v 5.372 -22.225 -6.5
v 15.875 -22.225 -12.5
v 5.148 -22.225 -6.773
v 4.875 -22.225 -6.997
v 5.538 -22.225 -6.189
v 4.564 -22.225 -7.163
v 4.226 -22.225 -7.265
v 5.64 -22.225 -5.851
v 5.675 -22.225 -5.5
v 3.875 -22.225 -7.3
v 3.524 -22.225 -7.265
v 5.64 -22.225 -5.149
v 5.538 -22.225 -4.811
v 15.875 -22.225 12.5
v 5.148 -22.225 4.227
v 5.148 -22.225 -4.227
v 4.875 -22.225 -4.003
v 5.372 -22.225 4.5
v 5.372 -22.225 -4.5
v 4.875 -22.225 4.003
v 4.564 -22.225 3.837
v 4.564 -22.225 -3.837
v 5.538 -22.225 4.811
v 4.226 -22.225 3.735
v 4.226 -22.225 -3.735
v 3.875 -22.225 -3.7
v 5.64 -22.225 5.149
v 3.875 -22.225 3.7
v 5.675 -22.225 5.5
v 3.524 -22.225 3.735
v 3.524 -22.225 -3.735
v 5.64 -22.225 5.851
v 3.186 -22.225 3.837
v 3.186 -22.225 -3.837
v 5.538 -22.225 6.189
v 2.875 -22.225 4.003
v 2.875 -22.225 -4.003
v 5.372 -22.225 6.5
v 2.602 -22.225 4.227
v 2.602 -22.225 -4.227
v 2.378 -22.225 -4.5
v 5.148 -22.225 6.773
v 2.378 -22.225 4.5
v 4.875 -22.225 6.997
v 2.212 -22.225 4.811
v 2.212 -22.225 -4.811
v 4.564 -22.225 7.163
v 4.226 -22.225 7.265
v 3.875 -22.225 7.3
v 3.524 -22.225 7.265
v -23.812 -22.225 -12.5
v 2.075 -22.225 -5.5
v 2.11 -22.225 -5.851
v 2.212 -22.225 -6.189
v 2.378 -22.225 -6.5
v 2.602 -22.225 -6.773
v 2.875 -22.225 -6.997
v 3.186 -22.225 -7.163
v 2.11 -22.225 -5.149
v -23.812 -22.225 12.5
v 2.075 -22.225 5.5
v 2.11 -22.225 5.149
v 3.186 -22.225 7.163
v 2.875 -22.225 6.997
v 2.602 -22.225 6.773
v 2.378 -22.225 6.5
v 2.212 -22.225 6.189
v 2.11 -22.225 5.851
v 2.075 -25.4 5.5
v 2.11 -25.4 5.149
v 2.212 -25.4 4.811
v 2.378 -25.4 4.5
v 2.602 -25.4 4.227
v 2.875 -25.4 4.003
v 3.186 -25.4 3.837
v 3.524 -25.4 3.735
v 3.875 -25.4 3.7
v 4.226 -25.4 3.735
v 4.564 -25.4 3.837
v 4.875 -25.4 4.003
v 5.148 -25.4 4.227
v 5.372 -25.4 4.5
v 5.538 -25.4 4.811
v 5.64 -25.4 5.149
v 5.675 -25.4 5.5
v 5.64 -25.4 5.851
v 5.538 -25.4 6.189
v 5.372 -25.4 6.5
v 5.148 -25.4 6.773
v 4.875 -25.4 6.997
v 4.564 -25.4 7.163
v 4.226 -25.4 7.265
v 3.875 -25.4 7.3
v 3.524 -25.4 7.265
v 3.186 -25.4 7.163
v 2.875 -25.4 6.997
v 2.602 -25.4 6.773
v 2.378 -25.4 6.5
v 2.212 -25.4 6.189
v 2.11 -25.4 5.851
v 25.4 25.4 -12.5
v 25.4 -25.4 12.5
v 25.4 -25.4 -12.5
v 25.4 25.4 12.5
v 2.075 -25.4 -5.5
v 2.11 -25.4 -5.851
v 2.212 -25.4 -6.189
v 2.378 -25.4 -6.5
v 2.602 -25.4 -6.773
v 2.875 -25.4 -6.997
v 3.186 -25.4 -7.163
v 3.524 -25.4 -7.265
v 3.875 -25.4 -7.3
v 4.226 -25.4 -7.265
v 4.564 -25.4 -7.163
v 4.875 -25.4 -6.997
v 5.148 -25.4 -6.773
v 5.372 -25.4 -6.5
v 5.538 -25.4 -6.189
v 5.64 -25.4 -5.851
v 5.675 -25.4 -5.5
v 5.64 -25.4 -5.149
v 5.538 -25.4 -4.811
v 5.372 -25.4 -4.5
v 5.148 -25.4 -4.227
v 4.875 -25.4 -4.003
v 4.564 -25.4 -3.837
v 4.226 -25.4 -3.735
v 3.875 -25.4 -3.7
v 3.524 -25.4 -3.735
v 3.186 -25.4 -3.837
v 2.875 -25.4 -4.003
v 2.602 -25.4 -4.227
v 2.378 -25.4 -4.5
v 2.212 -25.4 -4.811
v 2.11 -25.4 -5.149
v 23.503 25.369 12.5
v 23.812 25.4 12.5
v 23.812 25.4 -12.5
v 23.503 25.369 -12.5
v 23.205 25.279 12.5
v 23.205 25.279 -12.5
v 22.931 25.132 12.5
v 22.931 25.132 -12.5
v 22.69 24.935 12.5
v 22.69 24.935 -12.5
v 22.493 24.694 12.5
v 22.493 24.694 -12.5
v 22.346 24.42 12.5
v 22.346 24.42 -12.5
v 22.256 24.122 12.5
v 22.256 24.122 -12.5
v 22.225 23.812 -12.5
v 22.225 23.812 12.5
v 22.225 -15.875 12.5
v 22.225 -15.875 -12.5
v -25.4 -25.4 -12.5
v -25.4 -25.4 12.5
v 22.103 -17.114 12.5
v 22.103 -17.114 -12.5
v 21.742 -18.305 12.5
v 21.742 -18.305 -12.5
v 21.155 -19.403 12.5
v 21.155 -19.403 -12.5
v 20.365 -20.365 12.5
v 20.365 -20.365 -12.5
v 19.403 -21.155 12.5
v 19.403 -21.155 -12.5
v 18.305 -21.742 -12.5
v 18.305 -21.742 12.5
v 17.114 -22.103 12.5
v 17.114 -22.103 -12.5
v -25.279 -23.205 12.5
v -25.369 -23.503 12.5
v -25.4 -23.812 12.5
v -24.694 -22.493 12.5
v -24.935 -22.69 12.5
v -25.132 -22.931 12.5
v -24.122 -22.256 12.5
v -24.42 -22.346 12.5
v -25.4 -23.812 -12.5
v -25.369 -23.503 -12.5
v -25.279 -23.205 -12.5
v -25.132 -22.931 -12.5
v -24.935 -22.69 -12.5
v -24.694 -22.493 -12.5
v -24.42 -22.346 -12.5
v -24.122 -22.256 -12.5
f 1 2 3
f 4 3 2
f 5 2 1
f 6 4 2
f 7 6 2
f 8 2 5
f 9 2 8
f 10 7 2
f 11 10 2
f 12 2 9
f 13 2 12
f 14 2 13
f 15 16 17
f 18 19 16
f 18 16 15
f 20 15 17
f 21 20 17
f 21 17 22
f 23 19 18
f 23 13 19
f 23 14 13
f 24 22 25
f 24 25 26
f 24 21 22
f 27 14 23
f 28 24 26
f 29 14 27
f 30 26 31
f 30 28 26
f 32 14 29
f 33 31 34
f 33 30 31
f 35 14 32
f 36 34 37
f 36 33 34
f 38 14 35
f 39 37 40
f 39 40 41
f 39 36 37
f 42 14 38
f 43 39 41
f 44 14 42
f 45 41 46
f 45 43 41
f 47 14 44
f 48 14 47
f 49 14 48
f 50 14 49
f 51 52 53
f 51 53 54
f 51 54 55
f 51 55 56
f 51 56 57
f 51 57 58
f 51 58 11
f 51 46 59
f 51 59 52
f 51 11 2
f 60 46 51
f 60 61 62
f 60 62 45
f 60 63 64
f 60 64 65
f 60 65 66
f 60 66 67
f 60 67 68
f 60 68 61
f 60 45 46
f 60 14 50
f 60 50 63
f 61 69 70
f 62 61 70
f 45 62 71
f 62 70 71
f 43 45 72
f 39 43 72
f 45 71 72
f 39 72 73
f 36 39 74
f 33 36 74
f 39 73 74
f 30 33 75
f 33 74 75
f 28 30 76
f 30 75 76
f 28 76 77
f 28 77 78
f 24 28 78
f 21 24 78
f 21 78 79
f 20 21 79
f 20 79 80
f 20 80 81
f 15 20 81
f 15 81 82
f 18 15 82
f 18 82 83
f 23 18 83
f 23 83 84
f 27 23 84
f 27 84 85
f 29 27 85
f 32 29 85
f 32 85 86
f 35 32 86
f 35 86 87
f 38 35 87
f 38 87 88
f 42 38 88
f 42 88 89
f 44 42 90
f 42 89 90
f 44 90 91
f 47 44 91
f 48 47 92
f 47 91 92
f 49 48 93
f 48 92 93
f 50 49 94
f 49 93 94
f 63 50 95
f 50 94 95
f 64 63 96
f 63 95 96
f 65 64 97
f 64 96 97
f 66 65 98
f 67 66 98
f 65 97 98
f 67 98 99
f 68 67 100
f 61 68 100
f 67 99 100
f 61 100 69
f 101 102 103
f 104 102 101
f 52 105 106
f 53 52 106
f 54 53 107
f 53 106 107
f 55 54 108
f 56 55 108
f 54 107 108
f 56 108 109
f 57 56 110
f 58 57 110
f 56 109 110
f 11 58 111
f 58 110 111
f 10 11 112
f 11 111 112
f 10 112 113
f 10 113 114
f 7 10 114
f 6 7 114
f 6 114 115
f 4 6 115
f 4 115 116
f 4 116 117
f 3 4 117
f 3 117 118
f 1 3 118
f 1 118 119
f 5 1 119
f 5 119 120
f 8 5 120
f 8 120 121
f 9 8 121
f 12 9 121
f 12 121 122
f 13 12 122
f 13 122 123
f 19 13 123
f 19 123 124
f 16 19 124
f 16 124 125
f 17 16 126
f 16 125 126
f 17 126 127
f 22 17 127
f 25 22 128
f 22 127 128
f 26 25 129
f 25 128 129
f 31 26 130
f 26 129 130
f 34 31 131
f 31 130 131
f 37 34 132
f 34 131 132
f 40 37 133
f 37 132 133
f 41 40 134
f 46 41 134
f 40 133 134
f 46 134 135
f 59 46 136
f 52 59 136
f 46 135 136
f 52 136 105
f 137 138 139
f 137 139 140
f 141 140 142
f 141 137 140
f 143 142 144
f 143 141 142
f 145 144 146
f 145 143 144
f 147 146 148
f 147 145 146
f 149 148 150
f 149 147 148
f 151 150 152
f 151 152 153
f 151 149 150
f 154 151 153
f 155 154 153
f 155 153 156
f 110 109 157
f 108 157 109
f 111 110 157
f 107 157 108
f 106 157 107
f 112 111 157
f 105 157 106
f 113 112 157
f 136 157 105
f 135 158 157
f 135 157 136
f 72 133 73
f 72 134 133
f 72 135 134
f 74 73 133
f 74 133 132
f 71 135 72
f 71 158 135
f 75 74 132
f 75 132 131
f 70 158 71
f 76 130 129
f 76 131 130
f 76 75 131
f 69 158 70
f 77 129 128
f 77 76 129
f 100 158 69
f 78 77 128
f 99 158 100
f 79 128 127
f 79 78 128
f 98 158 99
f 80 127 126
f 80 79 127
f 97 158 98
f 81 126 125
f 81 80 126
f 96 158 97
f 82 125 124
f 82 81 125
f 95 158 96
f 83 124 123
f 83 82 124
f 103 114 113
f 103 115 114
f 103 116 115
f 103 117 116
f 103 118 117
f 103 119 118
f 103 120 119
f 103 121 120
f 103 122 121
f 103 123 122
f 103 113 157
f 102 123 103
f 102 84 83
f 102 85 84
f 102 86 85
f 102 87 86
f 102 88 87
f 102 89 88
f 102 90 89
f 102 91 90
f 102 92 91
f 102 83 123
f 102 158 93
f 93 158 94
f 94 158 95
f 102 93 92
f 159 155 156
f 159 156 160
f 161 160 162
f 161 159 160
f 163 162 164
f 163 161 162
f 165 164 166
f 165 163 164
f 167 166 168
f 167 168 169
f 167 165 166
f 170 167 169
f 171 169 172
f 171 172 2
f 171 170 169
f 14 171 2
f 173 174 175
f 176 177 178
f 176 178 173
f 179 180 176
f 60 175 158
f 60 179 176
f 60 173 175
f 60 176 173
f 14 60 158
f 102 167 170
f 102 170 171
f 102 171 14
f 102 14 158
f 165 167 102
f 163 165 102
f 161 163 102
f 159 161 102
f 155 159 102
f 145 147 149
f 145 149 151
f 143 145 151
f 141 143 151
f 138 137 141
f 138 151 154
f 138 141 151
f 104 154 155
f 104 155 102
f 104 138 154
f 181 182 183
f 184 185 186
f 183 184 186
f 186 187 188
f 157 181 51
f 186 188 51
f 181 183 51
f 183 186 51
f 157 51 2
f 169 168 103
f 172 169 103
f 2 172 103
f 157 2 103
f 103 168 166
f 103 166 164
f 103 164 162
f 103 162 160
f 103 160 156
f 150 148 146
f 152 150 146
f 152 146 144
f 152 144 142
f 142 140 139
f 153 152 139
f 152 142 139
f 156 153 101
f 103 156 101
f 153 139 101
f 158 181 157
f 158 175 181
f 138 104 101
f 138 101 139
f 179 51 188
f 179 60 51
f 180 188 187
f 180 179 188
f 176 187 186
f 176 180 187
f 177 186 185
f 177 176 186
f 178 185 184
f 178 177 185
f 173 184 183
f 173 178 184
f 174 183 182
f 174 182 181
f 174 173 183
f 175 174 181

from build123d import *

# Parameters (mm, degrees)
BOSS_EXTRUDE1_DEPTH  = 12.500000019
M3_CLEARANCE_HOLE1_D = 3.6


with BuildPart() as part:
    # Sketch2 → Boss-Extrude1 (new, symmetric)
    with BuildSketch(Plane.XY):
        with BuildLine():
            Line((-25.4, -25.4), (25.4, -25.4))
            Line((25.4, -25.4), (25.4, 25.4))
            Line((25.4, 25.4), (23.8125, 25.4))
            ThreePointArc((23.8125, 25.4), (22.689967985, 24.935032015), (22.225, 23.8125))
            Line((22.225, 23.8125), (22.225, -15.875))
            ThreePointArc((22.225, -15.875), (20.365128061, -20.365128061), (15.875, -22.225))
            Line((15.875, -22.225), (-23.8125, -22.225))
            ThreePointArc((-23.8125, -22.225), (-24.935032015, -22.689967985), (-25.4, -23.8125))
            Line((-25.4, -23.8125), (-25.4, -25.4))
        make_face()
    extrude(amount=BOSS_EXTRUDE1_DEPTH, both=True)

    # M3 Clearance Hole1 (through all)
    with Locations(Plane(origin=(0, -22.225, 0), x_dir=(1, 0, 0), z_dir=(0, 1, 0))):
        with Locations((3.875000124, 5.500000049), (3.875000124, -5.500000049)):
            Hole(M3_CLEARANCE_HOLE1_D / 2)


solid = part.part
